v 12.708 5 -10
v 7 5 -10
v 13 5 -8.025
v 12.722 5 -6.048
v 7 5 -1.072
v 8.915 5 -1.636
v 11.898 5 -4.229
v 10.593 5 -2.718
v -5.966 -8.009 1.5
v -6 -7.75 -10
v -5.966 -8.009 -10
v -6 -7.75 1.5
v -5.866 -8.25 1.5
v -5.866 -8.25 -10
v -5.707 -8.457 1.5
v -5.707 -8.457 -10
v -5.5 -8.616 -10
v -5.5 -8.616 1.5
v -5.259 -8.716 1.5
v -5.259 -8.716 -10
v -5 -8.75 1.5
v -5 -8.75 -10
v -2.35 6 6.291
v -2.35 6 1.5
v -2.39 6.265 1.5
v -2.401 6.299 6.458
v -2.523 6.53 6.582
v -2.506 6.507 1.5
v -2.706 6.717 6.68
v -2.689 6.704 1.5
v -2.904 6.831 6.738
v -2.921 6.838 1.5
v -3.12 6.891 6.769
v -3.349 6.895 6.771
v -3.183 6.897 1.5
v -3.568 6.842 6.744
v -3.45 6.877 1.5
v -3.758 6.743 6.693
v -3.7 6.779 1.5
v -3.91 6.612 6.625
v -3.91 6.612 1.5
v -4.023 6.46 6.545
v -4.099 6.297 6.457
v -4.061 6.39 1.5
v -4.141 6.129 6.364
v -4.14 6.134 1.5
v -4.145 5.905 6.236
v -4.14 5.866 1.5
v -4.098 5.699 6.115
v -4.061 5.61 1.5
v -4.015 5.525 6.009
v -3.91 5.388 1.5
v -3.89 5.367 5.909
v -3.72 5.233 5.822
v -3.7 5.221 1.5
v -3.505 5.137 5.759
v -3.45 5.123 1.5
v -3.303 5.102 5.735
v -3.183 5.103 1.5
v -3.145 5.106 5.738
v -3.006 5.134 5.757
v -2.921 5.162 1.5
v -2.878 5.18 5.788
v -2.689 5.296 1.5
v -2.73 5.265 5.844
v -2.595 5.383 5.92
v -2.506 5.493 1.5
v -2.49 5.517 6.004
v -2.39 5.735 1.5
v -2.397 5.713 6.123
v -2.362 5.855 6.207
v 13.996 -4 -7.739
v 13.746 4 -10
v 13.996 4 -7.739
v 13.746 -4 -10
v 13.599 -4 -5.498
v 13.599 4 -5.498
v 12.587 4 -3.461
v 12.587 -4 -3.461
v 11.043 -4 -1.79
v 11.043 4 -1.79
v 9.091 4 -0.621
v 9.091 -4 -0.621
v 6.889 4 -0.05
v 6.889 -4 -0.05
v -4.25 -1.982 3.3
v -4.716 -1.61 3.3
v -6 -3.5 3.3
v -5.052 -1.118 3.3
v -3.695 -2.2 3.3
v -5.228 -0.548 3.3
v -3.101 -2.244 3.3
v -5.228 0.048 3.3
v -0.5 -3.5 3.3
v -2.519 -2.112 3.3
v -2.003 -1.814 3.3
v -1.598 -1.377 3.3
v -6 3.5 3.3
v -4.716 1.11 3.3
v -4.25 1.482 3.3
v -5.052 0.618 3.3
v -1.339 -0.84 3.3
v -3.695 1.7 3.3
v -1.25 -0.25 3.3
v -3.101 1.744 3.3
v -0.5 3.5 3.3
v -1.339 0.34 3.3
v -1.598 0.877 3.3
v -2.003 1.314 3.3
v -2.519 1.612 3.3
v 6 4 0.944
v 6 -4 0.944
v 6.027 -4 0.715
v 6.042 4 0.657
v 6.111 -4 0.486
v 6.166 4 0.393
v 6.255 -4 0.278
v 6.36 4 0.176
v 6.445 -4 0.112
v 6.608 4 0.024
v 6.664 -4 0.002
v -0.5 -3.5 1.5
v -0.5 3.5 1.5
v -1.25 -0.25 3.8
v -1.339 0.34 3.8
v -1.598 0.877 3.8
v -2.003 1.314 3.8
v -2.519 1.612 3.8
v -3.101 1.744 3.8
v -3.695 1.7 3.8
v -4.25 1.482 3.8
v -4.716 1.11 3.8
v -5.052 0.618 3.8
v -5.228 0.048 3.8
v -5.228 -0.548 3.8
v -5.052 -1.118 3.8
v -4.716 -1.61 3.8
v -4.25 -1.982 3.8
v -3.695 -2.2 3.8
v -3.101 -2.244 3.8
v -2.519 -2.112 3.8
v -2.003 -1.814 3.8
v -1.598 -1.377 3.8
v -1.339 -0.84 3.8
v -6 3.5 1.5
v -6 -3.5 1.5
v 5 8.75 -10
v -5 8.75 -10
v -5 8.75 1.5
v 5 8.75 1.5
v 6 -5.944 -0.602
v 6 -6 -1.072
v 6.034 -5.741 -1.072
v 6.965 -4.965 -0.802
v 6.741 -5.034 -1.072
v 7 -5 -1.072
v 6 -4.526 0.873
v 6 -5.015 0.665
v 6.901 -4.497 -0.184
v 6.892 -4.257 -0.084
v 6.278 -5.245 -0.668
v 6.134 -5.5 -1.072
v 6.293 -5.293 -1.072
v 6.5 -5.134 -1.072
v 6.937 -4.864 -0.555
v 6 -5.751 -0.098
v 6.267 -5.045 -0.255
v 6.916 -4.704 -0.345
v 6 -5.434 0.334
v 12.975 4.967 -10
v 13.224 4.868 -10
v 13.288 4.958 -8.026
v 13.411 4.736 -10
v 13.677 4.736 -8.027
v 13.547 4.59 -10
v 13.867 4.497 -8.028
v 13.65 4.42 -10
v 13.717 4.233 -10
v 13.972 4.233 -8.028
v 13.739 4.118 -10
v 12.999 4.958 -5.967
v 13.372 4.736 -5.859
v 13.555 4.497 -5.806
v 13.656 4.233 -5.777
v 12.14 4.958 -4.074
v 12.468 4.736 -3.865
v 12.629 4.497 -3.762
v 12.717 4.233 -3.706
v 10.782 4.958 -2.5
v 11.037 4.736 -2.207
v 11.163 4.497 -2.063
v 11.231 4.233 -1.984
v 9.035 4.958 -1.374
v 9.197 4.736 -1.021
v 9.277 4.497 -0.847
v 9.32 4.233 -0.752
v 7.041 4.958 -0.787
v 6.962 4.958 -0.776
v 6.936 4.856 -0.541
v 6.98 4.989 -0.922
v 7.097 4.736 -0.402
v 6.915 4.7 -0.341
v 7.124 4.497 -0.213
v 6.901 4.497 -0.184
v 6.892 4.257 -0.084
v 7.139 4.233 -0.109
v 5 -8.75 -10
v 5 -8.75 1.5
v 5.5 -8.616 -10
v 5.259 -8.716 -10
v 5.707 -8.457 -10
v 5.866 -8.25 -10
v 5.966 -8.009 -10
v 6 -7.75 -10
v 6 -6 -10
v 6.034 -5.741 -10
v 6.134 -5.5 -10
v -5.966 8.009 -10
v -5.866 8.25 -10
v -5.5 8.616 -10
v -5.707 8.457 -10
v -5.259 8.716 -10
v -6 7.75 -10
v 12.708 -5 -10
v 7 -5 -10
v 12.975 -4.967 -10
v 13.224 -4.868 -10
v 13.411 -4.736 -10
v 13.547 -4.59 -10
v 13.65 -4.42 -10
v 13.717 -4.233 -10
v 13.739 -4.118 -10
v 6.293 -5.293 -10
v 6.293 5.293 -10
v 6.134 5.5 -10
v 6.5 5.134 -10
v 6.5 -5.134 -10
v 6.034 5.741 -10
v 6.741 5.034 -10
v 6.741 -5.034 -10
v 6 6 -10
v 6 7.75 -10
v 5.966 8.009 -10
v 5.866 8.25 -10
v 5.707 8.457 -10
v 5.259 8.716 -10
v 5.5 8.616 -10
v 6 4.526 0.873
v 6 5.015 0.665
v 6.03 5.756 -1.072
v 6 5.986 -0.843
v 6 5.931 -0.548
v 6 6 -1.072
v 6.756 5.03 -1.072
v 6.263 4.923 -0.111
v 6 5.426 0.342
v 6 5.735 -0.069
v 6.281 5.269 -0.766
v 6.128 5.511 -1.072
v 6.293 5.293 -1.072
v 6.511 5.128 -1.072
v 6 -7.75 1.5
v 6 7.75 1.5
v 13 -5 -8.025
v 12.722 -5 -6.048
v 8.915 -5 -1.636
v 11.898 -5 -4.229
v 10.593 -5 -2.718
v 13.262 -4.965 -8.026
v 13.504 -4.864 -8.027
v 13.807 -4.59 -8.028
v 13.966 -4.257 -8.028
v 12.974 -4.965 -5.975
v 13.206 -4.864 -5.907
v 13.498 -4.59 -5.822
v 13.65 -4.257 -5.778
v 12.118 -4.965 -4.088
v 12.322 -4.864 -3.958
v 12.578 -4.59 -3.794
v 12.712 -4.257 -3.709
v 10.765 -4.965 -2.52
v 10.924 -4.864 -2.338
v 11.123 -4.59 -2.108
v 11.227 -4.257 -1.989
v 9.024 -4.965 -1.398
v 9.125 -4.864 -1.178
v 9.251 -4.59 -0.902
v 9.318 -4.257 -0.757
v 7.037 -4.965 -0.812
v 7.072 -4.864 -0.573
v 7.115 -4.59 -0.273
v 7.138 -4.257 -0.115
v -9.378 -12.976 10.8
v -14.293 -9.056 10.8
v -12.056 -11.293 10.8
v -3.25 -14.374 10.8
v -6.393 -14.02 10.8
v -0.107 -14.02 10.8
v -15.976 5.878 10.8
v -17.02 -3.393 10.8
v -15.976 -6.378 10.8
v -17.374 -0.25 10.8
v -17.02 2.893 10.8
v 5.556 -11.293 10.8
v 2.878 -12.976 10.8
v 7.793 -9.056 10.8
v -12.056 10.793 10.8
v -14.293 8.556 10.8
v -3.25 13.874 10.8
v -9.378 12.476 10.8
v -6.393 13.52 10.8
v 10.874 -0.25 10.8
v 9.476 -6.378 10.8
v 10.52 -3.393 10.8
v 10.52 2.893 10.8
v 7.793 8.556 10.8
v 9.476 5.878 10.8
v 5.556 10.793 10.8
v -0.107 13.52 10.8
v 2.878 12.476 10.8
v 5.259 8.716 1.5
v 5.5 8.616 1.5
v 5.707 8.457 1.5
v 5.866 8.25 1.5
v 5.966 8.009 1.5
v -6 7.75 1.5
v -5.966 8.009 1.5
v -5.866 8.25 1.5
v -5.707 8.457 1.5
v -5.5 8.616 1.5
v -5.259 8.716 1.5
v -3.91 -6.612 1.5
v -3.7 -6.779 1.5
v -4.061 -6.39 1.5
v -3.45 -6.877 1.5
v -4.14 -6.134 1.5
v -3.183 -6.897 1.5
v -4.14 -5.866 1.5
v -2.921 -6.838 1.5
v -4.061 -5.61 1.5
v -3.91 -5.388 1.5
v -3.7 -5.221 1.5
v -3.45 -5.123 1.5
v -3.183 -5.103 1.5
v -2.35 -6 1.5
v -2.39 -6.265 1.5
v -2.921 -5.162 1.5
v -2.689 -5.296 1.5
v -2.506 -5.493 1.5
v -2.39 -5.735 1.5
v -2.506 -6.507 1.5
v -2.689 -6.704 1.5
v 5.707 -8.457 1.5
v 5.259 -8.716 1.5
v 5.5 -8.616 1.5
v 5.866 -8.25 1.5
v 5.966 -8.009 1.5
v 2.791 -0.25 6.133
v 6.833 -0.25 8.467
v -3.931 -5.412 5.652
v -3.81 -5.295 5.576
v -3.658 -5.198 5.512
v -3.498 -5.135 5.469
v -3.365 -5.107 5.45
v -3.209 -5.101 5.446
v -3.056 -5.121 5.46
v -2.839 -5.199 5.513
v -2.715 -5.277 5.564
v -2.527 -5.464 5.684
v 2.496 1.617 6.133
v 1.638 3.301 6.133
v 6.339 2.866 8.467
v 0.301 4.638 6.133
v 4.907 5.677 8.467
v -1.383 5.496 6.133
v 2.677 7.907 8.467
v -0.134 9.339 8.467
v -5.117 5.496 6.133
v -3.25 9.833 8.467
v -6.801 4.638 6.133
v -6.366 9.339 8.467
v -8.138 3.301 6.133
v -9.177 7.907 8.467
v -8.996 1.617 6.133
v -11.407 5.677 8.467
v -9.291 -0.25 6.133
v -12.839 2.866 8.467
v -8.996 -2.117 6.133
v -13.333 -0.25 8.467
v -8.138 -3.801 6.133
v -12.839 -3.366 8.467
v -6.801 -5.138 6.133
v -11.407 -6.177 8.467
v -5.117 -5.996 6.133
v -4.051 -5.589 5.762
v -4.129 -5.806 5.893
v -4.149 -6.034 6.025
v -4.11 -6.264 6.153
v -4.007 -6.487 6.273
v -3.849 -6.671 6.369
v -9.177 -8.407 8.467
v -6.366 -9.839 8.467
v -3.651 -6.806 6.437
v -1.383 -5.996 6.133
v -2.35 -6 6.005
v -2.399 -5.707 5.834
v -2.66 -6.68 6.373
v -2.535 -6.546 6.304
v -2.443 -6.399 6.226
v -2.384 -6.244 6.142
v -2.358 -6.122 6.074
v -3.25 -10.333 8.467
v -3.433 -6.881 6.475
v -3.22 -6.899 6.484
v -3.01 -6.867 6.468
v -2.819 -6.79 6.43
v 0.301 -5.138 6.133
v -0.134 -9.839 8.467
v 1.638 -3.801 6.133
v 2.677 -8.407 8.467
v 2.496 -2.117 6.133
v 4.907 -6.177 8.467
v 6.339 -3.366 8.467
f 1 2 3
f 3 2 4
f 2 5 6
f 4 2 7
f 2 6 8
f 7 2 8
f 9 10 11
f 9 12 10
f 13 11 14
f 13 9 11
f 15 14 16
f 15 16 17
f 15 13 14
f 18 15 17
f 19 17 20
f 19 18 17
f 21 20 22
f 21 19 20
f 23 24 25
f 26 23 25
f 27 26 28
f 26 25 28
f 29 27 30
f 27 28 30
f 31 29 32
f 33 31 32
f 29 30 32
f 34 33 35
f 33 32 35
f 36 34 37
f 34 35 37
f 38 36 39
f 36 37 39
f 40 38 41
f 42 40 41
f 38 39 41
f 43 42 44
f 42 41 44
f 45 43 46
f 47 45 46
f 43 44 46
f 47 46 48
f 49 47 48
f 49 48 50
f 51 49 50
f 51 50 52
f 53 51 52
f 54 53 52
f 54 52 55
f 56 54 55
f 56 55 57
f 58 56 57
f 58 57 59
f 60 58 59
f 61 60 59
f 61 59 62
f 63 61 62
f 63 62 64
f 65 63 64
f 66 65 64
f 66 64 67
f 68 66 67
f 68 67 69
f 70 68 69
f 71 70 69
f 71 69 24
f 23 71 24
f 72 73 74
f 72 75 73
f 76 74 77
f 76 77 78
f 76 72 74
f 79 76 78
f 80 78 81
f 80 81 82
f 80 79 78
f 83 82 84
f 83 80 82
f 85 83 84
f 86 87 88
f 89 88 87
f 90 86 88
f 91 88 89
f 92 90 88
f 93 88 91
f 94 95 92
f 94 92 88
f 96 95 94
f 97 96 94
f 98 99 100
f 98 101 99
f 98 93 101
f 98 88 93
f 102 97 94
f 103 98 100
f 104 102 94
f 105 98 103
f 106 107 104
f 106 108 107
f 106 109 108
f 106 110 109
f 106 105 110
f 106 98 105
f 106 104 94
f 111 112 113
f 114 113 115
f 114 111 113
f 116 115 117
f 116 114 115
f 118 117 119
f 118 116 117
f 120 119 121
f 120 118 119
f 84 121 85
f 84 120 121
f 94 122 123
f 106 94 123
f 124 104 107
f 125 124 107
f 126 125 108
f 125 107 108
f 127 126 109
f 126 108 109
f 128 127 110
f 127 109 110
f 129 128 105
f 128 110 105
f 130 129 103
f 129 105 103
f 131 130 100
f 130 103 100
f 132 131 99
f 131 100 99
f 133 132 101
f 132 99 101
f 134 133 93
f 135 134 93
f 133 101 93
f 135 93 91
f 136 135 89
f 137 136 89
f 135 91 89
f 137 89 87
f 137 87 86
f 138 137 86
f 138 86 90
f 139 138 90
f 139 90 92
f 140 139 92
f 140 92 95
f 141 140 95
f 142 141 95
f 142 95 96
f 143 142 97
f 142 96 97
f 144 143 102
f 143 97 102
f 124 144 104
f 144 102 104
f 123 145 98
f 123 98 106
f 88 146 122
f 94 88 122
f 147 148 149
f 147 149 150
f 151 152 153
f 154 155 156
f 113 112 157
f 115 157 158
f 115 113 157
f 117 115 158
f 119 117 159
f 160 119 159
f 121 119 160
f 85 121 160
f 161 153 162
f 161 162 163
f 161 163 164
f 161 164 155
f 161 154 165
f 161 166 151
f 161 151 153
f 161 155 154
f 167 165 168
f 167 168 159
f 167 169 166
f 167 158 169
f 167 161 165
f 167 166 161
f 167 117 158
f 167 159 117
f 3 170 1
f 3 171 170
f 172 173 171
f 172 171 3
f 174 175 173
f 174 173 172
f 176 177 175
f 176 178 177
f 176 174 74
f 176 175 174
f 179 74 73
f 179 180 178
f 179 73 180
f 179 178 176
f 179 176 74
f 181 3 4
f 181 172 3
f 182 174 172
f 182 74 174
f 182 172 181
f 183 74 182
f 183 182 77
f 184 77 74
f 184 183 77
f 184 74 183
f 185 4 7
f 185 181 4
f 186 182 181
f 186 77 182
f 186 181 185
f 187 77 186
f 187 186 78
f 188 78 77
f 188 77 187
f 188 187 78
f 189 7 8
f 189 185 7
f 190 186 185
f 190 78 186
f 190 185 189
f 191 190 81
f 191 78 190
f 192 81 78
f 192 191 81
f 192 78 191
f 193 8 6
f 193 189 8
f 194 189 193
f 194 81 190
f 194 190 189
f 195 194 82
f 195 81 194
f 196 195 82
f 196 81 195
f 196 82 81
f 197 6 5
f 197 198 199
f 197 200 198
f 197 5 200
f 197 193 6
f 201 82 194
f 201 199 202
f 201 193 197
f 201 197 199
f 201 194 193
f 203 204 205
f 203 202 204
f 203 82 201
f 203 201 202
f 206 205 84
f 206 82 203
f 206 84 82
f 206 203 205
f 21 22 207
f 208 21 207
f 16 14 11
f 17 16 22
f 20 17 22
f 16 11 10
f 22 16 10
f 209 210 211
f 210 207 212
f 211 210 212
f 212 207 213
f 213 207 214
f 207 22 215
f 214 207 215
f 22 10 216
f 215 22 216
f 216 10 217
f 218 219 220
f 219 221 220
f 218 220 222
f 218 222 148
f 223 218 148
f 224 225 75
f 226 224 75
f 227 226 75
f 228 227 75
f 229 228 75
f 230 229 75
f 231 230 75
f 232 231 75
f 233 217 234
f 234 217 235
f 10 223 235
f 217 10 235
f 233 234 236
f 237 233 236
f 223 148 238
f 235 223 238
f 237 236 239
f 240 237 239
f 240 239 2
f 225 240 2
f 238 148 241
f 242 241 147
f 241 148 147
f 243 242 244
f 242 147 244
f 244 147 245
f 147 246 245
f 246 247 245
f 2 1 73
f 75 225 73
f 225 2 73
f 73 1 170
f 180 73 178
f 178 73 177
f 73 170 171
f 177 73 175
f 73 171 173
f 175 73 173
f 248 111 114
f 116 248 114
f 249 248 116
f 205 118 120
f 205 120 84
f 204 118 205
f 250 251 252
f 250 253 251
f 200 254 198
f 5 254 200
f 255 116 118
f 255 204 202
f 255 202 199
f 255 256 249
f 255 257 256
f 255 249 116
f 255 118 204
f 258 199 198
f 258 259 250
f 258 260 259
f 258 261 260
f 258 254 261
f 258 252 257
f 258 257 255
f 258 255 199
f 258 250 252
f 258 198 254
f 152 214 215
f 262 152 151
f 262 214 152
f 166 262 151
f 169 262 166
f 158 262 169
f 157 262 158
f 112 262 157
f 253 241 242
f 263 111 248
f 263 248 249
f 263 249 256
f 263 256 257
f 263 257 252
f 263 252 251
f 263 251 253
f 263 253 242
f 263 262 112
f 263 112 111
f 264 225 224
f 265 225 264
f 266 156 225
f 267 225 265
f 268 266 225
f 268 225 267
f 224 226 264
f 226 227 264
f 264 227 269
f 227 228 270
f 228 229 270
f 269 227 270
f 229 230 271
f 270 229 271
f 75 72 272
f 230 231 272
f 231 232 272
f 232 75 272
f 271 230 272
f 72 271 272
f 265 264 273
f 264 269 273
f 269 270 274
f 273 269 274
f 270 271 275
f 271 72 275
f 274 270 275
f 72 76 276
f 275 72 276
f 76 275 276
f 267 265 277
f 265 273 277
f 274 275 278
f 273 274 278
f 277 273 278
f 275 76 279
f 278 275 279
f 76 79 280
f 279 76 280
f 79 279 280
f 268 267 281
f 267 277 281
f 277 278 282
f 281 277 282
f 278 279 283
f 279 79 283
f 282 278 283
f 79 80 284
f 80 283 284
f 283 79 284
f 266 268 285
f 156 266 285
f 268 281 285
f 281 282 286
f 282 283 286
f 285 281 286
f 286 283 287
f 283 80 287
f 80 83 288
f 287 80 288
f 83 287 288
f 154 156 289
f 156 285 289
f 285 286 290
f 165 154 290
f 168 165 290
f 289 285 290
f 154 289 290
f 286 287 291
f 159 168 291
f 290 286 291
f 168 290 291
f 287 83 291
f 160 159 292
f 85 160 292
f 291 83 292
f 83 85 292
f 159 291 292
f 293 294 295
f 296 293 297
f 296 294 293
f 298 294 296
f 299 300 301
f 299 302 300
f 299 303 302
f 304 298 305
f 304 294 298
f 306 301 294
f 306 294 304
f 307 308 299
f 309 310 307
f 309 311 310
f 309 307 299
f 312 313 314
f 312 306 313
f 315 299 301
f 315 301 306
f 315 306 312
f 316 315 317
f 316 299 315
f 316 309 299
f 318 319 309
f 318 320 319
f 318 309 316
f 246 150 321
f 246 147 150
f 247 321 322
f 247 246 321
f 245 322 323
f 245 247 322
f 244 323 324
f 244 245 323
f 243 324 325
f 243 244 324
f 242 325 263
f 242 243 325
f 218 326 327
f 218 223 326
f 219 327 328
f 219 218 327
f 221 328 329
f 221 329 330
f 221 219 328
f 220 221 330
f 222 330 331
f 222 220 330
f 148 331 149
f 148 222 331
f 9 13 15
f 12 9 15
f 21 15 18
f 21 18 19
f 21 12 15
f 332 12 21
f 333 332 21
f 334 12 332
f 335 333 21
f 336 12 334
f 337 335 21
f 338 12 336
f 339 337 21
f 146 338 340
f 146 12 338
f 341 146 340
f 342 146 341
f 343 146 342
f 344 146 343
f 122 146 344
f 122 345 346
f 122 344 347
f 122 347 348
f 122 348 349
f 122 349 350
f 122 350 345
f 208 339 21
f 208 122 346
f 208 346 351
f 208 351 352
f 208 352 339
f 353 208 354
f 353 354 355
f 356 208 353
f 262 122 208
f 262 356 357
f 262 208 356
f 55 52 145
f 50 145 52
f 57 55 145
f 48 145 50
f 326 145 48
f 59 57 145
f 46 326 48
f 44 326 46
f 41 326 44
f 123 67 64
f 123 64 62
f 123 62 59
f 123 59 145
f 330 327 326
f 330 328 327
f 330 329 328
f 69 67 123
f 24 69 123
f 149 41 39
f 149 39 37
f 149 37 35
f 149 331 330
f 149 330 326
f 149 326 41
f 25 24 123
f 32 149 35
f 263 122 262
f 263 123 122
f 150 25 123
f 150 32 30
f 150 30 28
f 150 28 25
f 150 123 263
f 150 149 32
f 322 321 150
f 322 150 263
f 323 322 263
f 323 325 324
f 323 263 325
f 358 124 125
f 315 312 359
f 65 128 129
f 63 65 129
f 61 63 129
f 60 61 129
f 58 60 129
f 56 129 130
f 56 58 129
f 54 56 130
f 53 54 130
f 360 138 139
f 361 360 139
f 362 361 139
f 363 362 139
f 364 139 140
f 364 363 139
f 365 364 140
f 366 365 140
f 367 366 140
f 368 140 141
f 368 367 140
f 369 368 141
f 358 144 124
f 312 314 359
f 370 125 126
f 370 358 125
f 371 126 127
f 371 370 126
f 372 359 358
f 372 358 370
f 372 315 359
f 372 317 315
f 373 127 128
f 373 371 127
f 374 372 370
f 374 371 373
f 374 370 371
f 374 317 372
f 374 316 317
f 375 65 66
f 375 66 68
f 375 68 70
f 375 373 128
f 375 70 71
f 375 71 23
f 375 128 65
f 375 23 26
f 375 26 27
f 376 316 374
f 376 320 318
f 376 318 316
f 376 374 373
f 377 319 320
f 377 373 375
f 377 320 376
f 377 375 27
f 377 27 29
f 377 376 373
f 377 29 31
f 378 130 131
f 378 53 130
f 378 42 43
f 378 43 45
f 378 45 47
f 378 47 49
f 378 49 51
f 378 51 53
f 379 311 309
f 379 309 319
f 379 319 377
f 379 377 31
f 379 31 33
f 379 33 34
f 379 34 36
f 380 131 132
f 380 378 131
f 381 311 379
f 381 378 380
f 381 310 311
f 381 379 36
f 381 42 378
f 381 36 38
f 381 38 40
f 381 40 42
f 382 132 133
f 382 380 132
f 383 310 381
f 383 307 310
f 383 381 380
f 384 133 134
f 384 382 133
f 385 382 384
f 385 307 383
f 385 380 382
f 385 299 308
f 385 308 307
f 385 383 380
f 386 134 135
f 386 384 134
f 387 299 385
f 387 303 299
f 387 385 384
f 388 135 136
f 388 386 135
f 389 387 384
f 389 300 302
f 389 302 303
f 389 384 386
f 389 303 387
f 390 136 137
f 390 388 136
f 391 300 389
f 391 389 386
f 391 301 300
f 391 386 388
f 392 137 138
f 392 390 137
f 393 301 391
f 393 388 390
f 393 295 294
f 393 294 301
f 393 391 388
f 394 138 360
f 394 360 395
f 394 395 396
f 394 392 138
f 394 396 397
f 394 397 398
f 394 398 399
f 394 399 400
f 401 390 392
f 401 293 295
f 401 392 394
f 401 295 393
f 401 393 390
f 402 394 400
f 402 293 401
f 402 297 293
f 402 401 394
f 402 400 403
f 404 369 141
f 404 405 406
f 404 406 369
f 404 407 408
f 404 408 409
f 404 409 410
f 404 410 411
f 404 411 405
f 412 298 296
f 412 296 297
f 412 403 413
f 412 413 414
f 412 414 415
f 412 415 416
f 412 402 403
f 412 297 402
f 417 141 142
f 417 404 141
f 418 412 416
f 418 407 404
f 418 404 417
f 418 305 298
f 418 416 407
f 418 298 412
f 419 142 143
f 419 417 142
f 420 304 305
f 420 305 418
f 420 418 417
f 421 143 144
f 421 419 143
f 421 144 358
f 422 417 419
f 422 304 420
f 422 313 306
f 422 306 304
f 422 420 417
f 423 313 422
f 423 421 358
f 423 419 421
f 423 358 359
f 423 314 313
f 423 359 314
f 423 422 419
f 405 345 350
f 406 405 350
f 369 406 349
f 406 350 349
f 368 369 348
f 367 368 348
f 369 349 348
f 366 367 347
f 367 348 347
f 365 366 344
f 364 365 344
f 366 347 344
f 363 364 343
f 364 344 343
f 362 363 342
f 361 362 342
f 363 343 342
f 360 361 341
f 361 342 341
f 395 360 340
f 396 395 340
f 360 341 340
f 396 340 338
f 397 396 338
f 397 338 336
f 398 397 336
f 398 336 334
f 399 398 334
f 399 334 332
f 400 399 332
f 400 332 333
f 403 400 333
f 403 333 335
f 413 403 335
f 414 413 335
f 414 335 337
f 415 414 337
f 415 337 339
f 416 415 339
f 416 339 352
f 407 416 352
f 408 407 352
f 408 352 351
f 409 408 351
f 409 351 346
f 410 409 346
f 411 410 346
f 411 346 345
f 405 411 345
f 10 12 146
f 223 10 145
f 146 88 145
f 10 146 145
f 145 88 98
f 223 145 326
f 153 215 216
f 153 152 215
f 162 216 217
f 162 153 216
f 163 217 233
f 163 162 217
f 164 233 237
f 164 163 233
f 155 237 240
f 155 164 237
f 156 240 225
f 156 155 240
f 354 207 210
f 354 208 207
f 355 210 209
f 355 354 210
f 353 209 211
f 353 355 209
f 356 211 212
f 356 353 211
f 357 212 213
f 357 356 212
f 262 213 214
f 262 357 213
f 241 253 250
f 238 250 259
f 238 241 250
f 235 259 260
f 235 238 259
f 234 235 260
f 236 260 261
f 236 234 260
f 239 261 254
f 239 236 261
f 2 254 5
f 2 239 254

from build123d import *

# Parameters (mm, degrees)
SKETCH_W       = 12
SKETCH_H       = 17.5
PAD_DEPTH      = 1.5
PAD_DEPTH_BACK = 10
SKETCH001_R    = 0.9
PAD001_DEPTH   = 10
PAD002_DEPTH   = 5
FILLET_R       = 1
FILLET001_R    = 1
FILLET002_R    = 1
SKETCH003_W    = 5.5
SKETCH003_H    = 7
PAD003_DEPTH   = 1.8
SKETCH004_R    = 2
PAD004_DEPTH   = 0.5
SKETCH005_R    = 2
PAD005_DEPTH   = 7
PAD005_TAPER   = -60


with BuildPart() as part:
    # Sketch → Pad (new body, two sides)
    with BuildSketch(Plane.XY) as pad_sk:
        Rectangle(SKETCH_W, SKETCH_H)
    extrude(amount=PAD_DEPTH)
    extrude(pad_sk.sketch, amount=-PAD_DEPTH_BACK)

    # Sketch001 → Pad001 (join)
    with BuildSketch(Plane.XY):
        with Locations((-3.25, 6)):
            Circle(SKETCH001_R)
        with Locations((-3.25, -6)):
            Circle(SKETCH001_R)
    extrude(amount=PAD001_DEPTH)

    # Sketch002 → Pad002 (join, symmetric)
    with BuildSketch(Plane.XZ):
        with BuildLine():
            ThreePointArc((13.745967, -10), (12.324555, -3.101021), (6, 0))
            Line((6, -10), (6, 0))
            Line((13.745967, -10), (6, -10))
        make_face()
    extrude(amount=PAD002_DEPTH, both=True)

    # Fillet
    fillet_edges = [part.edges().sort_by_distance(p)[0] for p in [
        (6, -8.75, -4.25),
        (-6, -8.75, -4.25),
        (6, 8.75, -4.25),
        (-6, 8.75, -4.25),
    ]]
    fillet(fillet_edges, radius=FILLET_R)

    # Fillet001
    fillet001_edges = [part.edges().sort_by_distance(p)[0] for p in [
        (12.324555, -5, -3.101021),
        (12.324555, 5, -3.101021),
    ]]
    fillet(fillet001_edges, radius=FILLET001_R)

    # Fillet002
    fillet002_edges = [part.edges().sort_by_distance(p)[0] for p in [
        (6, -5, -5.5),
    ]]
    fillet(fillet002_edges, radius=FILLET002_R)

    # Sketch003 (on Face6 of Fillet002) → Pad003 (join)
    with BuildSketch(Plane.XY.offset(1.5)):
        with Locations((-3.25, 0)):
            Rectangle(SKETCH003_W, SKETCH003_H)
    extrude(amount=PAD003_DEPTH)

    # Sketch004 (on Face28 of Pad003) → Pad004 (join)
    with BuildSketch(Plane.XY.offset(3.3)):
        with Locations((-3.25, -0.25)):
            Circle(SKETCH004_R)
    extrude(amount=PAD004_DEPTH)

    # Sketch005 (on Face32 of Pad004) → Pad005 (join)
    with BuildSketch(Plane.XY.offset(3.8)):
        with Locations((-3.25, -0.25)):
            Circle(SKETCH005_R)
    extrude(amount=PAD005_DEPTH, taper=PAD005_TAPER)


solid = part.part
